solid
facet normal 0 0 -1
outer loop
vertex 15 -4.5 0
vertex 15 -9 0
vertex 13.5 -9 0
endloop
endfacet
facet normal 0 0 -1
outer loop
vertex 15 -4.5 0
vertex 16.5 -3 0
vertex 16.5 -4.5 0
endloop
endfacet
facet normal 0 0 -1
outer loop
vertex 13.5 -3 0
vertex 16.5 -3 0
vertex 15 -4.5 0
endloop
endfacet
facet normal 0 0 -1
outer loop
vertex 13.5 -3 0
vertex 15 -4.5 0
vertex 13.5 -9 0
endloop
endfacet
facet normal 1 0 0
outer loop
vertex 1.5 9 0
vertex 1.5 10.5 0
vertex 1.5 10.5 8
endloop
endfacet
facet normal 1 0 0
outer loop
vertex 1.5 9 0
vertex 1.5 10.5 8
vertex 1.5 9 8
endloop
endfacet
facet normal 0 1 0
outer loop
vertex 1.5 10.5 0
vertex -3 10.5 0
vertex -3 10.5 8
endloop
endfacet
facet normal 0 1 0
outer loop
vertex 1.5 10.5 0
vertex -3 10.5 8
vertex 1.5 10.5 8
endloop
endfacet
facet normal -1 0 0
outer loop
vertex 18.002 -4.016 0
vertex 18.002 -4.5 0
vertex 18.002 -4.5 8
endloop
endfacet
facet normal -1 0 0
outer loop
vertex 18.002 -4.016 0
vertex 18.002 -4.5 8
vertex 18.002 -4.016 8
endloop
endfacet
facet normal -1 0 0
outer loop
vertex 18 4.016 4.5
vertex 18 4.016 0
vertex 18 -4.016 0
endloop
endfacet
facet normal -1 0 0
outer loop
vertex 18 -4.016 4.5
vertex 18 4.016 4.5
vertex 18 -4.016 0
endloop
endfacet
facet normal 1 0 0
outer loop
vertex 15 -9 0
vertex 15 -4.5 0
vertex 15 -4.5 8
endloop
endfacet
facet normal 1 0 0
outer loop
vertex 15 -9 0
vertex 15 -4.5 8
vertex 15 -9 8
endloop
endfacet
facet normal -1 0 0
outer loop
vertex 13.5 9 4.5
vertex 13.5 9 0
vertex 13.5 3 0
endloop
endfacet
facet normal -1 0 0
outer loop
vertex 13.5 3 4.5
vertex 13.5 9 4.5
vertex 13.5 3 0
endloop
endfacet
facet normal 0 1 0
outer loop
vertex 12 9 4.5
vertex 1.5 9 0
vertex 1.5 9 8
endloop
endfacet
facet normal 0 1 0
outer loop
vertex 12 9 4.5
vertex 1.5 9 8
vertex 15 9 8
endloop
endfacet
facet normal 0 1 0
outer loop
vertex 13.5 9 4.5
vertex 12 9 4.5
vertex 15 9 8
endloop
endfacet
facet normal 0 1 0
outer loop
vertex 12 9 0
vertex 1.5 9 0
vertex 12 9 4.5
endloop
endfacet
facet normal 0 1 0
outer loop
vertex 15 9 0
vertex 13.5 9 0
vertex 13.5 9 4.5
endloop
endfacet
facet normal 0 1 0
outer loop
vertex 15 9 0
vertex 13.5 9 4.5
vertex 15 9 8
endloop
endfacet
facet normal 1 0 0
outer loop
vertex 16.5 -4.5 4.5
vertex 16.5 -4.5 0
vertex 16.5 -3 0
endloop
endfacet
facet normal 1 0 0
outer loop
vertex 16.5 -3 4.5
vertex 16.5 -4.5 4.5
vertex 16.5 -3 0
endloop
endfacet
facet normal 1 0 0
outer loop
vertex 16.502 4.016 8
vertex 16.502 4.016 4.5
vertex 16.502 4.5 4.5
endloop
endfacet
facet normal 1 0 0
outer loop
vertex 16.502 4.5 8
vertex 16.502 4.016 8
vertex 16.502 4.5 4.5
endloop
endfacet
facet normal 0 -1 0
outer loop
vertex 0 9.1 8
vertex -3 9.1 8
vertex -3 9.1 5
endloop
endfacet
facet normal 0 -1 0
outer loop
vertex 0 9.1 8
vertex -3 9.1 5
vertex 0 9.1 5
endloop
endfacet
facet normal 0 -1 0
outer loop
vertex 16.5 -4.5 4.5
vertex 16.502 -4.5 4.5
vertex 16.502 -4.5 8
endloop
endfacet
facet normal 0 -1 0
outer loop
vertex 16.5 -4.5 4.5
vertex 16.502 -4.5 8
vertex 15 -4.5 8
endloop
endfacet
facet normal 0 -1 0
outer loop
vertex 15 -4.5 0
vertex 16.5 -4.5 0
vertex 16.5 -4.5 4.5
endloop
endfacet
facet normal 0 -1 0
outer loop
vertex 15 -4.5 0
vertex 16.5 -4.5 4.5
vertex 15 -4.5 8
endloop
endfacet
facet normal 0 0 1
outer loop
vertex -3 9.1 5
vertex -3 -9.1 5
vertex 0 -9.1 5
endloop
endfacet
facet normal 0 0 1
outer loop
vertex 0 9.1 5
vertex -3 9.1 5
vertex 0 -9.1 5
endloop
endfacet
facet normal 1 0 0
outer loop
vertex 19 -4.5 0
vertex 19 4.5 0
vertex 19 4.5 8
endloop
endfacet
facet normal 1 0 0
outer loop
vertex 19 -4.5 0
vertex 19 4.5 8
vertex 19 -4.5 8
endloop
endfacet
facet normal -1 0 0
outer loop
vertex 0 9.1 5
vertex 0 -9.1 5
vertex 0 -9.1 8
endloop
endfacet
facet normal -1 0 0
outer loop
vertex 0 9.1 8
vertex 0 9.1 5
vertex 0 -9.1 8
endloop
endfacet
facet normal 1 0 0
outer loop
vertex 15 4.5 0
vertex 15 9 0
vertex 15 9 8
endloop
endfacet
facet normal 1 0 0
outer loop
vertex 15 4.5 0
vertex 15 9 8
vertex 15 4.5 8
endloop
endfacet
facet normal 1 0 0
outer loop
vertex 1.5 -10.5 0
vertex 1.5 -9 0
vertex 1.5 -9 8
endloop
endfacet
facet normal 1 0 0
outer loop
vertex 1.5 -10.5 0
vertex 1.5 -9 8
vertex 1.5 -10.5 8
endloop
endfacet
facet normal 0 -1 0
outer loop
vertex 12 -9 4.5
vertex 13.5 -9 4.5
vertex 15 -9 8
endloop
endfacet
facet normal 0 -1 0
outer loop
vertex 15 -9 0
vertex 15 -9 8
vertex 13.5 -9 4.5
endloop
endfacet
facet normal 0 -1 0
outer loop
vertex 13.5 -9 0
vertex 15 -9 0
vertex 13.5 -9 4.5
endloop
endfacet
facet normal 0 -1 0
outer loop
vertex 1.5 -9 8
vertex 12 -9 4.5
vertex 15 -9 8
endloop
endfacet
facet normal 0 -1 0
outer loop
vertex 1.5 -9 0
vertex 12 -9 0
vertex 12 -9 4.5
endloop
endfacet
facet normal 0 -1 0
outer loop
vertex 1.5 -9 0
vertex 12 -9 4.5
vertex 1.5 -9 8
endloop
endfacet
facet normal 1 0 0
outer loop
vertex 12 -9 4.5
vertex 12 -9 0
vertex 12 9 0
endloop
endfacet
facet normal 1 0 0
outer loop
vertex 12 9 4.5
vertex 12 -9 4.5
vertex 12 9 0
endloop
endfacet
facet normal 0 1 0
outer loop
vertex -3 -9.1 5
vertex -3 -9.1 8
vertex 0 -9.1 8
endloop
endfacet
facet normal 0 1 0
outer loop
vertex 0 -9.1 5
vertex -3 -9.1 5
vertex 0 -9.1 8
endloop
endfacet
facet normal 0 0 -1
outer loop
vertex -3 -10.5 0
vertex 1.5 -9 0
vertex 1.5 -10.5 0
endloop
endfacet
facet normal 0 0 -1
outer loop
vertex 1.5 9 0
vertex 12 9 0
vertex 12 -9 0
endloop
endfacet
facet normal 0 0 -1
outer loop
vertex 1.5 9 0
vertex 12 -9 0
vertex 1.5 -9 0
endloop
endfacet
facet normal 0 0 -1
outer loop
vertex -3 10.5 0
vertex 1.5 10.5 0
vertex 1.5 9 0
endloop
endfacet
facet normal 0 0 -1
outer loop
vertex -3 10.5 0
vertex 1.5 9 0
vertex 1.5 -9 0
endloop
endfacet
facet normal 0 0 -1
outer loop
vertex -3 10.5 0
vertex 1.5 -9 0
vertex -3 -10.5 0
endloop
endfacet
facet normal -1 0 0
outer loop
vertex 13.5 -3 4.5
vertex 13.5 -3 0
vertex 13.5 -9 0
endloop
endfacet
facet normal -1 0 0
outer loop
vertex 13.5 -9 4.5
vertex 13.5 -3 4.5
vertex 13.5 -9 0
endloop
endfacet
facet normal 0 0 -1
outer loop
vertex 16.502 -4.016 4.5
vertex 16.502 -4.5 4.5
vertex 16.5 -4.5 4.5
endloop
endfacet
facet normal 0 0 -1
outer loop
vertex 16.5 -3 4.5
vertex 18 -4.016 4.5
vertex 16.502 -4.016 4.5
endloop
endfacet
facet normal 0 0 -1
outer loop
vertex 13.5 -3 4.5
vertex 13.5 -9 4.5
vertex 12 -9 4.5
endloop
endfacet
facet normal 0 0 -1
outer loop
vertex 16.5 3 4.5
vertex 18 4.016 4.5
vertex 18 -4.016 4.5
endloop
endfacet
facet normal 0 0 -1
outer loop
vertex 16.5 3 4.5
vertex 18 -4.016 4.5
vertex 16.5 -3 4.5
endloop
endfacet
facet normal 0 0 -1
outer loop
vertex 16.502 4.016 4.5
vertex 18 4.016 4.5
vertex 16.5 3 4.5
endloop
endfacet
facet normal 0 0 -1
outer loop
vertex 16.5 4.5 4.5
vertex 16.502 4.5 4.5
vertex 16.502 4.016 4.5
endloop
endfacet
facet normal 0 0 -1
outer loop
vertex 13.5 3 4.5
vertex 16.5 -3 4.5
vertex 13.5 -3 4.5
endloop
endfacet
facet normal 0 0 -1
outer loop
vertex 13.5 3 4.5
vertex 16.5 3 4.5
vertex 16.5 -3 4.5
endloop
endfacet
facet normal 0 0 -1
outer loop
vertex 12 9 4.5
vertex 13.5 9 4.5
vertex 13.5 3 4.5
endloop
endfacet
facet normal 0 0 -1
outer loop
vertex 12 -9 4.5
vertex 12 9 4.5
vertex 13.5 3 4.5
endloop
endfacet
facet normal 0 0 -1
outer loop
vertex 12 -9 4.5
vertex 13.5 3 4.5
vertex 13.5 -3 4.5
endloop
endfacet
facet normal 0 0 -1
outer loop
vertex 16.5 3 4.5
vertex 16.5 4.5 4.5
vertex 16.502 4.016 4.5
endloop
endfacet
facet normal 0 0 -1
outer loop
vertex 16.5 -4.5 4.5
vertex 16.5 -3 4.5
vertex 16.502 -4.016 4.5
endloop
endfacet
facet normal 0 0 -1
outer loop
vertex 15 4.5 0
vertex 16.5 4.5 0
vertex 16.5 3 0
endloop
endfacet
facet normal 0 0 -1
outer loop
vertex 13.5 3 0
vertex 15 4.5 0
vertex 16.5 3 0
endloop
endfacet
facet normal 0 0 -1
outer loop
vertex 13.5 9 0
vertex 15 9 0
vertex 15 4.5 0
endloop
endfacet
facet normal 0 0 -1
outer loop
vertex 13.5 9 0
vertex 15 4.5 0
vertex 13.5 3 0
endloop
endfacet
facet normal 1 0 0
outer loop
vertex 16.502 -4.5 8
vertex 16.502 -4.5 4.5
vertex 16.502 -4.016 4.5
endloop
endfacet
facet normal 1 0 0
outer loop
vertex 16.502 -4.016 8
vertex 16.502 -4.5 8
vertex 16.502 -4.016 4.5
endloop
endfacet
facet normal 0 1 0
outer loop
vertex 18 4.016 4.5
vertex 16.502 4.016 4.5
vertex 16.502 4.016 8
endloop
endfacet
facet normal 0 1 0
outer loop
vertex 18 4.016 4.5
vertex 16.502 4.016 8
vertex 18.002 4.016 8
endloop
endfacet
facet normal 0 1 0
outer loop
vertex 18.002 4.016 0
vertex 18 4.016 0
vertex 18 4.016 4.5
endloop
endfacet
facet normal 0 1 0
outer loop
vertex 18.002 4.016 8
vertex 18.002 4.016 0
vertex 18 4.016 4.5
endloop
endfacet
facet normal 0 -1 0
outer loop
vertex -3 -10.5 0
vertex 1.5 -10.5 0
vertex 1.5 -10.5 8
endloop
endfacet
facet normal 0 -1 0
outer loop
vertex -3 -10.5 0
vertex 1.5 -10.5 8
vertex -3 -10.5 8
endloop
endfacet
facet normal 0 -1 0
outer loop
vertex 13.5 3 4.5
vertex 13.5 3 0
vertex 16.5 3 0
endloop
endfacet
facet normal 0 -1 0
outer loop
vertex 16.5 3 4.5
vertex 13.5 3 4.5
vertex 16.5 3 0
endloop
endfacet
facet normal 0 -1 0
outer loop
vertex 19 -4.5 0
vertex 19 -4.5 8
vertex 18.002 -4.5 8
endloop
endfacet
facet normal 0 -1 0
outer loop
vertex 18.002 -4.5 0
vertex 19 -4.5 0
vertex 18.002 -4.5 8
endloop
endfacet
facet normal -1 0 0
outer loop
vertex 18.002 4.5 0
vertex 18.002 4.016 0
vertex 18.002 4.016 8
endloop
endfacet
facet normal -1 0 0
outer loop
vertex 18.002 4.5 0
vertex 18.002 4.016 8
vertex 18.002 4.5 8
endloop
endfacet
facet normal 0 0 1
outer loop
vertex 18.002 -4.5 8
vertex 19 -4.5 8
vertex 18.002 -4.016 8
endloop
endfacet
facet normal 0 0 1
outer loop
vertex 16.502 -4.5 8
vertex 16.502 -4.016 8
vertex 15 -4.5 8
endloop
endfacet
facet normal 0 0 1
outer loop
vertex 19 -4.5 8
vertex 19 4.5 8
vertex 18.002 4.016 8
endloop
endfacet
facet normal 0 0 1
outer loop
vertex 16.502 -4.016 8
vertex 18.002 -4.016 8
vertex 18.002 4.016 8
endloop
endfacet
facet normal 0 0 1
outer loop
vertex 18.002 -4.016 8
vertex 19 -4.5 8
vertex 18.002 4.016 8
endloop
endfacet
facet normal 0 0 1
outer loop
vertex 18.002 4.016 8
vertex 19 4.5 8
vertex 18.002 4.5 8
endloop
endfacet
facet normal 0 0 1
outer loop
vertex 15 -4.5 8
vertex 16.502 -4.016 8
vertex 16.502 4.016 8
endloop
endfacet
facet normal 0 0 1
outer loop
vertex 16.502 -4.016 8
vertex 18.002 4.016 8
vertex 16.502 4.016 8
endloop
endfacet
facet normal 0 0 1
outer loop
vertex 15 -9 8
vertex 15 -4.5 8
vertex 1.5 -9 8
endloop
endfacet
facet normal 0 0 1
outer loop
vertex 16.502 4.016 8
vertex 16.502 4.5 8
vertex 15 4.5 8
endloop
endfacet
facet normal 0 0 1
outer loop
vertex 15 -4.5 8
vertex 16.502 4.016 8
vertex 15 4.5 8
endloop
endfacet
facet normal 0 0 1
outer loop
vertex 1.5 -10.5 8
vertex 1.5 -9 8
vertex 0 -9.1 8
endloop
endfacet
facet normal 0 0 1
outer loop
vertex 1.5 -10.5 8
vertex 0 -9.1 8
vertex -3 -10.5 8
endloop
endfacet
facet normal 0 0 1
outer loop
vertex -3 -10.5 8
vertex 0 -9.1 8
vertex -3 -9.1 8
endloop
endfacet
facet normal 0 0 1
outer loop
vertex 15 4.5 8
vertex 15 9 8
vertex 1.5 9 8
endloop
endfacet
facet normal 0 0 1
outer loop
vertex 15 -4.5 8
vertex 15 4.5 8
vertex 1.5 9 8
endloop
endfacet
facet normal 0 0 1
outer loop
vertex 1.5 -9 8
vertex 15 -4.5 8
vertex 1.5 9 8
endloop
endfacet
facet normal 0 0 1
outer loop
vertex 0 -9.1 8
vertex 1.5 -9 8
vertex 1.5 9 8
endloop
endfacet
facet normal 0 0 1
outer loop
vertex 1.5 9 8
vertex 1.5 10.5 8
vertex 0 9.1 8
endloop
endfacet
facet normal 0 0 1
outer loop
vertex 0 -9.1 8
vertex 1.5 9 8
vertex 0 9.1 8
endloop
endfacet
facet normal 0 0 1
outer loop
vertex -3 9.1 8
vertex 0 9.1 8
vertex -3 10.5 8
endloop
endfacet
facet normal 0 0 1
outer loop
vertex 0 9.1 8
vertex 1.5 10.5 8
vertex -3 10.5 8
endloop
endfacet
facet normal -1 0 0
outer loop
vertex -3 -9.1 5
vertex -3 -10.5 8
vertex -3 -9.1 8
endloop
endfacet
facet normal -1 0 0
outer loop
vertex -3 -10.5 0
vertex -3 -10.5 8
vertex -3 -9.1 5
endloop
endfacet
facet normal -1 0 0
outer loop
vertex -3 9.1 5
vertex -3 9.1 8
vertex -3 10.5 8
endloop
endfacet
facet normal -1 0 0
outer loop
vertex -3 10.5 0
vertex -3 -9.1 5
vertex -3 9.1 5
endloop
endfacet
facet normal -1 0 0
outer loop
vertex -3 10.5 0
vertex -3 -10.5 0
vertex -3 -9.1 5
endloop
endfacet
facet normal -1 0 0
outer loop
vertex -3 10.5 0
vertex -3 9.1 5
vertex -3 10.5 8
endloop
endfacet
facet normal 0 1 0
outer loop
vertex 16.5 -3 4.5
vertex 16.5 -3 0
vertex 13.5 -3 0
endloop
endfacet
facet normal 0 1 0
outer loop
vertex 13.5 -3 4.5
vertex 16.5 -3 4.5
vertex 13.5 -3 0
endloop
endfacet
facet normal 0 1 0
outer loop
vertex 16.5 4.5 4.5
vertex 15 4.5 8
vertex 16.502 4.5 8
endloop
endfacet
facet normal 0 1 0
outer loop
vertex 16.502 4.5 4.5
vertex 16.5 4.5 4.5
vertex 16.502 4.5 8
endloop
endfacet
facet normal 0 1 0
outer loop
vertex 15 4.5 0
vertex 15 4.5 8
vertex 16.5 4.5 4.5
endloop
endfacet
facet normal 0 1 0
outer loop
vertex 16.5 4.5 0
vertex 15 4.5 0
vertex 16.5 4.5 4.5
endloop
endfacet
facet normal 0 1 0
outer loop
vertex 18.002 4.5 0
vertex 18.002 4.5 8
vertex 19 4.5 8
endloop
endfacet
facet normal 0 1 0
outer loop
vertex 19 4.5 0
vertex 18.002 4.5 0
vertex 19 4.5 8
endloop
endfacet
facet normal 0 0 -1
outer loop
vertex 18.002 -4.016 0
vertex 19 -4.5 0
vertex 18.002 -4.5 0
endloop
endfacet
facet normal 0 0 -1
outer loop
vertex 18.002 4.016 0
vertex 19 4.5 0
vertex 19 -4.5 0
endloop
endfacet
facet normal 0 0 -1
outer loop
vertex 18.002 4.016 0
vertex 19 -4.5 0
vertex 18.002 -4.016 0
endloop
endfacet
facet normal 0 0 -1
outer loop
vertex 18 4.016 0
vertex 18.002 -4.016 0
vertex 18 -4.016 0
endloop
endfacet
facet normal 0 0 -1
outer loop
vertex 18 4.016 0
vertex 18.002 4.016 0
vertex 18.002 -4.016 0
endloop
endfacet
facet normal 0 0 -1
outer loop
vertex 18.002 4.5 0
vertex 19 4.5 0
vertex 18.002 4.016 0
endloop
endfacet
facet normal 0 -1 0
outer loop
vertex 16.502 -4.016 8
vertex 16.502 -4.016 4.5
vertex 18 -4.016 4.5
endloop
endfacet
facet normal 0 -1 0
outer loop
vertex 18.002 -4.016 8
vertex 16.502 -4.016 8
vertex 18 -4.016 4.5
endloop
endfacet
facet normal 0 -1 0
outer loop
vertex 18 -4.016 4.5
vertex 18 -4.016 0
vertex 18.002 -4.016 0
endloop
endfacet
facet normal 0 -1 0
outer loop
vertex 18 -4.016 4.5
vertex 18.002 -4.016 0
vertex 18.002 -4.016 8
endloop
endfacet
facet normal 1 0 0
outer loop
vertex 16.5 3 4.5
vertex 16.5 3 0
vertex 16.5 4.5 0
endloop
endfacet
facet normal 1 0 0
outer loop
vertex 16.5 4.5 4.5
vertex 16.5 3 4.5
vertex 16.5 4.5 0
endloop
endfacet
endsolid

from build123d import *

# Parameters (mm, degrees)
PAD_DEPTH       = 8
SKETCH001_W     = 10
SKETCH001_H     = 10
POCKET_DEPTH    = 9.1
POCKET006_DEPTH = 4.5
SKETCH016_W     = 1.5
SKETCH016_H     = 1.5
SKETCH016_H_2   = 2.241798
POCKET007_DEPTH = 8.001


with BuildPart() as part:
    # Sketch → Pad (new body)
    with BuildSketch(Plane.XY):
        Polygon((1.5, 9), (15, 9), (15, 4.5), (19, 4.5), (19, -4.5), (15, -4.5), (15, -9), (1.5, -9), (1.5, -10.5), (-3, -10.5), (-3, 10.5), (1.5, 10.5), align=None)
    extrude(amount=PAD_DEPTH)

    # Sketch001 → Pocket (cut, symmetric)
    with BuildSketch(Plane.XZ):
        with Locations((-5, 10)):
            Rectangle(SKETCH001_W, SKETCH001_H)
    extrude(amount=POCKET_DEPTH, both=True, mode=Mode.SUBTRACT)

    # Sketch015 → Pocket006 (cut)
    with BuildSketch(Plane.XY):
        Polygon((12, 10), (13.5, 10), (13.5, 3), (16.5, 3), (16.5, 10), (18, 10), (18, -10), (16.5, -10), (16.5, -3), (13.5, -3), (13.5, -10), (12, -10), align=None)
    extrude(amount=POCKET006_DEPTH, mode=Mode.SUBTRACT)

    # Sketch016 → Pocket007 (cut, through all)
    with BuildSketch(Plane.XY):
        with Locations((17.251662, 4.766245)):
            Rectangle(SKETCH016_W, SKETCH016_H)
        with Locations((17.251662, -5.137144)):
            Rectangle(SKETCH016_W, SKETCH016_H_2)
    extrude(amount=POCKET007_DEPTH, mode=Mode.SUBTRACT)


solid = part.part
